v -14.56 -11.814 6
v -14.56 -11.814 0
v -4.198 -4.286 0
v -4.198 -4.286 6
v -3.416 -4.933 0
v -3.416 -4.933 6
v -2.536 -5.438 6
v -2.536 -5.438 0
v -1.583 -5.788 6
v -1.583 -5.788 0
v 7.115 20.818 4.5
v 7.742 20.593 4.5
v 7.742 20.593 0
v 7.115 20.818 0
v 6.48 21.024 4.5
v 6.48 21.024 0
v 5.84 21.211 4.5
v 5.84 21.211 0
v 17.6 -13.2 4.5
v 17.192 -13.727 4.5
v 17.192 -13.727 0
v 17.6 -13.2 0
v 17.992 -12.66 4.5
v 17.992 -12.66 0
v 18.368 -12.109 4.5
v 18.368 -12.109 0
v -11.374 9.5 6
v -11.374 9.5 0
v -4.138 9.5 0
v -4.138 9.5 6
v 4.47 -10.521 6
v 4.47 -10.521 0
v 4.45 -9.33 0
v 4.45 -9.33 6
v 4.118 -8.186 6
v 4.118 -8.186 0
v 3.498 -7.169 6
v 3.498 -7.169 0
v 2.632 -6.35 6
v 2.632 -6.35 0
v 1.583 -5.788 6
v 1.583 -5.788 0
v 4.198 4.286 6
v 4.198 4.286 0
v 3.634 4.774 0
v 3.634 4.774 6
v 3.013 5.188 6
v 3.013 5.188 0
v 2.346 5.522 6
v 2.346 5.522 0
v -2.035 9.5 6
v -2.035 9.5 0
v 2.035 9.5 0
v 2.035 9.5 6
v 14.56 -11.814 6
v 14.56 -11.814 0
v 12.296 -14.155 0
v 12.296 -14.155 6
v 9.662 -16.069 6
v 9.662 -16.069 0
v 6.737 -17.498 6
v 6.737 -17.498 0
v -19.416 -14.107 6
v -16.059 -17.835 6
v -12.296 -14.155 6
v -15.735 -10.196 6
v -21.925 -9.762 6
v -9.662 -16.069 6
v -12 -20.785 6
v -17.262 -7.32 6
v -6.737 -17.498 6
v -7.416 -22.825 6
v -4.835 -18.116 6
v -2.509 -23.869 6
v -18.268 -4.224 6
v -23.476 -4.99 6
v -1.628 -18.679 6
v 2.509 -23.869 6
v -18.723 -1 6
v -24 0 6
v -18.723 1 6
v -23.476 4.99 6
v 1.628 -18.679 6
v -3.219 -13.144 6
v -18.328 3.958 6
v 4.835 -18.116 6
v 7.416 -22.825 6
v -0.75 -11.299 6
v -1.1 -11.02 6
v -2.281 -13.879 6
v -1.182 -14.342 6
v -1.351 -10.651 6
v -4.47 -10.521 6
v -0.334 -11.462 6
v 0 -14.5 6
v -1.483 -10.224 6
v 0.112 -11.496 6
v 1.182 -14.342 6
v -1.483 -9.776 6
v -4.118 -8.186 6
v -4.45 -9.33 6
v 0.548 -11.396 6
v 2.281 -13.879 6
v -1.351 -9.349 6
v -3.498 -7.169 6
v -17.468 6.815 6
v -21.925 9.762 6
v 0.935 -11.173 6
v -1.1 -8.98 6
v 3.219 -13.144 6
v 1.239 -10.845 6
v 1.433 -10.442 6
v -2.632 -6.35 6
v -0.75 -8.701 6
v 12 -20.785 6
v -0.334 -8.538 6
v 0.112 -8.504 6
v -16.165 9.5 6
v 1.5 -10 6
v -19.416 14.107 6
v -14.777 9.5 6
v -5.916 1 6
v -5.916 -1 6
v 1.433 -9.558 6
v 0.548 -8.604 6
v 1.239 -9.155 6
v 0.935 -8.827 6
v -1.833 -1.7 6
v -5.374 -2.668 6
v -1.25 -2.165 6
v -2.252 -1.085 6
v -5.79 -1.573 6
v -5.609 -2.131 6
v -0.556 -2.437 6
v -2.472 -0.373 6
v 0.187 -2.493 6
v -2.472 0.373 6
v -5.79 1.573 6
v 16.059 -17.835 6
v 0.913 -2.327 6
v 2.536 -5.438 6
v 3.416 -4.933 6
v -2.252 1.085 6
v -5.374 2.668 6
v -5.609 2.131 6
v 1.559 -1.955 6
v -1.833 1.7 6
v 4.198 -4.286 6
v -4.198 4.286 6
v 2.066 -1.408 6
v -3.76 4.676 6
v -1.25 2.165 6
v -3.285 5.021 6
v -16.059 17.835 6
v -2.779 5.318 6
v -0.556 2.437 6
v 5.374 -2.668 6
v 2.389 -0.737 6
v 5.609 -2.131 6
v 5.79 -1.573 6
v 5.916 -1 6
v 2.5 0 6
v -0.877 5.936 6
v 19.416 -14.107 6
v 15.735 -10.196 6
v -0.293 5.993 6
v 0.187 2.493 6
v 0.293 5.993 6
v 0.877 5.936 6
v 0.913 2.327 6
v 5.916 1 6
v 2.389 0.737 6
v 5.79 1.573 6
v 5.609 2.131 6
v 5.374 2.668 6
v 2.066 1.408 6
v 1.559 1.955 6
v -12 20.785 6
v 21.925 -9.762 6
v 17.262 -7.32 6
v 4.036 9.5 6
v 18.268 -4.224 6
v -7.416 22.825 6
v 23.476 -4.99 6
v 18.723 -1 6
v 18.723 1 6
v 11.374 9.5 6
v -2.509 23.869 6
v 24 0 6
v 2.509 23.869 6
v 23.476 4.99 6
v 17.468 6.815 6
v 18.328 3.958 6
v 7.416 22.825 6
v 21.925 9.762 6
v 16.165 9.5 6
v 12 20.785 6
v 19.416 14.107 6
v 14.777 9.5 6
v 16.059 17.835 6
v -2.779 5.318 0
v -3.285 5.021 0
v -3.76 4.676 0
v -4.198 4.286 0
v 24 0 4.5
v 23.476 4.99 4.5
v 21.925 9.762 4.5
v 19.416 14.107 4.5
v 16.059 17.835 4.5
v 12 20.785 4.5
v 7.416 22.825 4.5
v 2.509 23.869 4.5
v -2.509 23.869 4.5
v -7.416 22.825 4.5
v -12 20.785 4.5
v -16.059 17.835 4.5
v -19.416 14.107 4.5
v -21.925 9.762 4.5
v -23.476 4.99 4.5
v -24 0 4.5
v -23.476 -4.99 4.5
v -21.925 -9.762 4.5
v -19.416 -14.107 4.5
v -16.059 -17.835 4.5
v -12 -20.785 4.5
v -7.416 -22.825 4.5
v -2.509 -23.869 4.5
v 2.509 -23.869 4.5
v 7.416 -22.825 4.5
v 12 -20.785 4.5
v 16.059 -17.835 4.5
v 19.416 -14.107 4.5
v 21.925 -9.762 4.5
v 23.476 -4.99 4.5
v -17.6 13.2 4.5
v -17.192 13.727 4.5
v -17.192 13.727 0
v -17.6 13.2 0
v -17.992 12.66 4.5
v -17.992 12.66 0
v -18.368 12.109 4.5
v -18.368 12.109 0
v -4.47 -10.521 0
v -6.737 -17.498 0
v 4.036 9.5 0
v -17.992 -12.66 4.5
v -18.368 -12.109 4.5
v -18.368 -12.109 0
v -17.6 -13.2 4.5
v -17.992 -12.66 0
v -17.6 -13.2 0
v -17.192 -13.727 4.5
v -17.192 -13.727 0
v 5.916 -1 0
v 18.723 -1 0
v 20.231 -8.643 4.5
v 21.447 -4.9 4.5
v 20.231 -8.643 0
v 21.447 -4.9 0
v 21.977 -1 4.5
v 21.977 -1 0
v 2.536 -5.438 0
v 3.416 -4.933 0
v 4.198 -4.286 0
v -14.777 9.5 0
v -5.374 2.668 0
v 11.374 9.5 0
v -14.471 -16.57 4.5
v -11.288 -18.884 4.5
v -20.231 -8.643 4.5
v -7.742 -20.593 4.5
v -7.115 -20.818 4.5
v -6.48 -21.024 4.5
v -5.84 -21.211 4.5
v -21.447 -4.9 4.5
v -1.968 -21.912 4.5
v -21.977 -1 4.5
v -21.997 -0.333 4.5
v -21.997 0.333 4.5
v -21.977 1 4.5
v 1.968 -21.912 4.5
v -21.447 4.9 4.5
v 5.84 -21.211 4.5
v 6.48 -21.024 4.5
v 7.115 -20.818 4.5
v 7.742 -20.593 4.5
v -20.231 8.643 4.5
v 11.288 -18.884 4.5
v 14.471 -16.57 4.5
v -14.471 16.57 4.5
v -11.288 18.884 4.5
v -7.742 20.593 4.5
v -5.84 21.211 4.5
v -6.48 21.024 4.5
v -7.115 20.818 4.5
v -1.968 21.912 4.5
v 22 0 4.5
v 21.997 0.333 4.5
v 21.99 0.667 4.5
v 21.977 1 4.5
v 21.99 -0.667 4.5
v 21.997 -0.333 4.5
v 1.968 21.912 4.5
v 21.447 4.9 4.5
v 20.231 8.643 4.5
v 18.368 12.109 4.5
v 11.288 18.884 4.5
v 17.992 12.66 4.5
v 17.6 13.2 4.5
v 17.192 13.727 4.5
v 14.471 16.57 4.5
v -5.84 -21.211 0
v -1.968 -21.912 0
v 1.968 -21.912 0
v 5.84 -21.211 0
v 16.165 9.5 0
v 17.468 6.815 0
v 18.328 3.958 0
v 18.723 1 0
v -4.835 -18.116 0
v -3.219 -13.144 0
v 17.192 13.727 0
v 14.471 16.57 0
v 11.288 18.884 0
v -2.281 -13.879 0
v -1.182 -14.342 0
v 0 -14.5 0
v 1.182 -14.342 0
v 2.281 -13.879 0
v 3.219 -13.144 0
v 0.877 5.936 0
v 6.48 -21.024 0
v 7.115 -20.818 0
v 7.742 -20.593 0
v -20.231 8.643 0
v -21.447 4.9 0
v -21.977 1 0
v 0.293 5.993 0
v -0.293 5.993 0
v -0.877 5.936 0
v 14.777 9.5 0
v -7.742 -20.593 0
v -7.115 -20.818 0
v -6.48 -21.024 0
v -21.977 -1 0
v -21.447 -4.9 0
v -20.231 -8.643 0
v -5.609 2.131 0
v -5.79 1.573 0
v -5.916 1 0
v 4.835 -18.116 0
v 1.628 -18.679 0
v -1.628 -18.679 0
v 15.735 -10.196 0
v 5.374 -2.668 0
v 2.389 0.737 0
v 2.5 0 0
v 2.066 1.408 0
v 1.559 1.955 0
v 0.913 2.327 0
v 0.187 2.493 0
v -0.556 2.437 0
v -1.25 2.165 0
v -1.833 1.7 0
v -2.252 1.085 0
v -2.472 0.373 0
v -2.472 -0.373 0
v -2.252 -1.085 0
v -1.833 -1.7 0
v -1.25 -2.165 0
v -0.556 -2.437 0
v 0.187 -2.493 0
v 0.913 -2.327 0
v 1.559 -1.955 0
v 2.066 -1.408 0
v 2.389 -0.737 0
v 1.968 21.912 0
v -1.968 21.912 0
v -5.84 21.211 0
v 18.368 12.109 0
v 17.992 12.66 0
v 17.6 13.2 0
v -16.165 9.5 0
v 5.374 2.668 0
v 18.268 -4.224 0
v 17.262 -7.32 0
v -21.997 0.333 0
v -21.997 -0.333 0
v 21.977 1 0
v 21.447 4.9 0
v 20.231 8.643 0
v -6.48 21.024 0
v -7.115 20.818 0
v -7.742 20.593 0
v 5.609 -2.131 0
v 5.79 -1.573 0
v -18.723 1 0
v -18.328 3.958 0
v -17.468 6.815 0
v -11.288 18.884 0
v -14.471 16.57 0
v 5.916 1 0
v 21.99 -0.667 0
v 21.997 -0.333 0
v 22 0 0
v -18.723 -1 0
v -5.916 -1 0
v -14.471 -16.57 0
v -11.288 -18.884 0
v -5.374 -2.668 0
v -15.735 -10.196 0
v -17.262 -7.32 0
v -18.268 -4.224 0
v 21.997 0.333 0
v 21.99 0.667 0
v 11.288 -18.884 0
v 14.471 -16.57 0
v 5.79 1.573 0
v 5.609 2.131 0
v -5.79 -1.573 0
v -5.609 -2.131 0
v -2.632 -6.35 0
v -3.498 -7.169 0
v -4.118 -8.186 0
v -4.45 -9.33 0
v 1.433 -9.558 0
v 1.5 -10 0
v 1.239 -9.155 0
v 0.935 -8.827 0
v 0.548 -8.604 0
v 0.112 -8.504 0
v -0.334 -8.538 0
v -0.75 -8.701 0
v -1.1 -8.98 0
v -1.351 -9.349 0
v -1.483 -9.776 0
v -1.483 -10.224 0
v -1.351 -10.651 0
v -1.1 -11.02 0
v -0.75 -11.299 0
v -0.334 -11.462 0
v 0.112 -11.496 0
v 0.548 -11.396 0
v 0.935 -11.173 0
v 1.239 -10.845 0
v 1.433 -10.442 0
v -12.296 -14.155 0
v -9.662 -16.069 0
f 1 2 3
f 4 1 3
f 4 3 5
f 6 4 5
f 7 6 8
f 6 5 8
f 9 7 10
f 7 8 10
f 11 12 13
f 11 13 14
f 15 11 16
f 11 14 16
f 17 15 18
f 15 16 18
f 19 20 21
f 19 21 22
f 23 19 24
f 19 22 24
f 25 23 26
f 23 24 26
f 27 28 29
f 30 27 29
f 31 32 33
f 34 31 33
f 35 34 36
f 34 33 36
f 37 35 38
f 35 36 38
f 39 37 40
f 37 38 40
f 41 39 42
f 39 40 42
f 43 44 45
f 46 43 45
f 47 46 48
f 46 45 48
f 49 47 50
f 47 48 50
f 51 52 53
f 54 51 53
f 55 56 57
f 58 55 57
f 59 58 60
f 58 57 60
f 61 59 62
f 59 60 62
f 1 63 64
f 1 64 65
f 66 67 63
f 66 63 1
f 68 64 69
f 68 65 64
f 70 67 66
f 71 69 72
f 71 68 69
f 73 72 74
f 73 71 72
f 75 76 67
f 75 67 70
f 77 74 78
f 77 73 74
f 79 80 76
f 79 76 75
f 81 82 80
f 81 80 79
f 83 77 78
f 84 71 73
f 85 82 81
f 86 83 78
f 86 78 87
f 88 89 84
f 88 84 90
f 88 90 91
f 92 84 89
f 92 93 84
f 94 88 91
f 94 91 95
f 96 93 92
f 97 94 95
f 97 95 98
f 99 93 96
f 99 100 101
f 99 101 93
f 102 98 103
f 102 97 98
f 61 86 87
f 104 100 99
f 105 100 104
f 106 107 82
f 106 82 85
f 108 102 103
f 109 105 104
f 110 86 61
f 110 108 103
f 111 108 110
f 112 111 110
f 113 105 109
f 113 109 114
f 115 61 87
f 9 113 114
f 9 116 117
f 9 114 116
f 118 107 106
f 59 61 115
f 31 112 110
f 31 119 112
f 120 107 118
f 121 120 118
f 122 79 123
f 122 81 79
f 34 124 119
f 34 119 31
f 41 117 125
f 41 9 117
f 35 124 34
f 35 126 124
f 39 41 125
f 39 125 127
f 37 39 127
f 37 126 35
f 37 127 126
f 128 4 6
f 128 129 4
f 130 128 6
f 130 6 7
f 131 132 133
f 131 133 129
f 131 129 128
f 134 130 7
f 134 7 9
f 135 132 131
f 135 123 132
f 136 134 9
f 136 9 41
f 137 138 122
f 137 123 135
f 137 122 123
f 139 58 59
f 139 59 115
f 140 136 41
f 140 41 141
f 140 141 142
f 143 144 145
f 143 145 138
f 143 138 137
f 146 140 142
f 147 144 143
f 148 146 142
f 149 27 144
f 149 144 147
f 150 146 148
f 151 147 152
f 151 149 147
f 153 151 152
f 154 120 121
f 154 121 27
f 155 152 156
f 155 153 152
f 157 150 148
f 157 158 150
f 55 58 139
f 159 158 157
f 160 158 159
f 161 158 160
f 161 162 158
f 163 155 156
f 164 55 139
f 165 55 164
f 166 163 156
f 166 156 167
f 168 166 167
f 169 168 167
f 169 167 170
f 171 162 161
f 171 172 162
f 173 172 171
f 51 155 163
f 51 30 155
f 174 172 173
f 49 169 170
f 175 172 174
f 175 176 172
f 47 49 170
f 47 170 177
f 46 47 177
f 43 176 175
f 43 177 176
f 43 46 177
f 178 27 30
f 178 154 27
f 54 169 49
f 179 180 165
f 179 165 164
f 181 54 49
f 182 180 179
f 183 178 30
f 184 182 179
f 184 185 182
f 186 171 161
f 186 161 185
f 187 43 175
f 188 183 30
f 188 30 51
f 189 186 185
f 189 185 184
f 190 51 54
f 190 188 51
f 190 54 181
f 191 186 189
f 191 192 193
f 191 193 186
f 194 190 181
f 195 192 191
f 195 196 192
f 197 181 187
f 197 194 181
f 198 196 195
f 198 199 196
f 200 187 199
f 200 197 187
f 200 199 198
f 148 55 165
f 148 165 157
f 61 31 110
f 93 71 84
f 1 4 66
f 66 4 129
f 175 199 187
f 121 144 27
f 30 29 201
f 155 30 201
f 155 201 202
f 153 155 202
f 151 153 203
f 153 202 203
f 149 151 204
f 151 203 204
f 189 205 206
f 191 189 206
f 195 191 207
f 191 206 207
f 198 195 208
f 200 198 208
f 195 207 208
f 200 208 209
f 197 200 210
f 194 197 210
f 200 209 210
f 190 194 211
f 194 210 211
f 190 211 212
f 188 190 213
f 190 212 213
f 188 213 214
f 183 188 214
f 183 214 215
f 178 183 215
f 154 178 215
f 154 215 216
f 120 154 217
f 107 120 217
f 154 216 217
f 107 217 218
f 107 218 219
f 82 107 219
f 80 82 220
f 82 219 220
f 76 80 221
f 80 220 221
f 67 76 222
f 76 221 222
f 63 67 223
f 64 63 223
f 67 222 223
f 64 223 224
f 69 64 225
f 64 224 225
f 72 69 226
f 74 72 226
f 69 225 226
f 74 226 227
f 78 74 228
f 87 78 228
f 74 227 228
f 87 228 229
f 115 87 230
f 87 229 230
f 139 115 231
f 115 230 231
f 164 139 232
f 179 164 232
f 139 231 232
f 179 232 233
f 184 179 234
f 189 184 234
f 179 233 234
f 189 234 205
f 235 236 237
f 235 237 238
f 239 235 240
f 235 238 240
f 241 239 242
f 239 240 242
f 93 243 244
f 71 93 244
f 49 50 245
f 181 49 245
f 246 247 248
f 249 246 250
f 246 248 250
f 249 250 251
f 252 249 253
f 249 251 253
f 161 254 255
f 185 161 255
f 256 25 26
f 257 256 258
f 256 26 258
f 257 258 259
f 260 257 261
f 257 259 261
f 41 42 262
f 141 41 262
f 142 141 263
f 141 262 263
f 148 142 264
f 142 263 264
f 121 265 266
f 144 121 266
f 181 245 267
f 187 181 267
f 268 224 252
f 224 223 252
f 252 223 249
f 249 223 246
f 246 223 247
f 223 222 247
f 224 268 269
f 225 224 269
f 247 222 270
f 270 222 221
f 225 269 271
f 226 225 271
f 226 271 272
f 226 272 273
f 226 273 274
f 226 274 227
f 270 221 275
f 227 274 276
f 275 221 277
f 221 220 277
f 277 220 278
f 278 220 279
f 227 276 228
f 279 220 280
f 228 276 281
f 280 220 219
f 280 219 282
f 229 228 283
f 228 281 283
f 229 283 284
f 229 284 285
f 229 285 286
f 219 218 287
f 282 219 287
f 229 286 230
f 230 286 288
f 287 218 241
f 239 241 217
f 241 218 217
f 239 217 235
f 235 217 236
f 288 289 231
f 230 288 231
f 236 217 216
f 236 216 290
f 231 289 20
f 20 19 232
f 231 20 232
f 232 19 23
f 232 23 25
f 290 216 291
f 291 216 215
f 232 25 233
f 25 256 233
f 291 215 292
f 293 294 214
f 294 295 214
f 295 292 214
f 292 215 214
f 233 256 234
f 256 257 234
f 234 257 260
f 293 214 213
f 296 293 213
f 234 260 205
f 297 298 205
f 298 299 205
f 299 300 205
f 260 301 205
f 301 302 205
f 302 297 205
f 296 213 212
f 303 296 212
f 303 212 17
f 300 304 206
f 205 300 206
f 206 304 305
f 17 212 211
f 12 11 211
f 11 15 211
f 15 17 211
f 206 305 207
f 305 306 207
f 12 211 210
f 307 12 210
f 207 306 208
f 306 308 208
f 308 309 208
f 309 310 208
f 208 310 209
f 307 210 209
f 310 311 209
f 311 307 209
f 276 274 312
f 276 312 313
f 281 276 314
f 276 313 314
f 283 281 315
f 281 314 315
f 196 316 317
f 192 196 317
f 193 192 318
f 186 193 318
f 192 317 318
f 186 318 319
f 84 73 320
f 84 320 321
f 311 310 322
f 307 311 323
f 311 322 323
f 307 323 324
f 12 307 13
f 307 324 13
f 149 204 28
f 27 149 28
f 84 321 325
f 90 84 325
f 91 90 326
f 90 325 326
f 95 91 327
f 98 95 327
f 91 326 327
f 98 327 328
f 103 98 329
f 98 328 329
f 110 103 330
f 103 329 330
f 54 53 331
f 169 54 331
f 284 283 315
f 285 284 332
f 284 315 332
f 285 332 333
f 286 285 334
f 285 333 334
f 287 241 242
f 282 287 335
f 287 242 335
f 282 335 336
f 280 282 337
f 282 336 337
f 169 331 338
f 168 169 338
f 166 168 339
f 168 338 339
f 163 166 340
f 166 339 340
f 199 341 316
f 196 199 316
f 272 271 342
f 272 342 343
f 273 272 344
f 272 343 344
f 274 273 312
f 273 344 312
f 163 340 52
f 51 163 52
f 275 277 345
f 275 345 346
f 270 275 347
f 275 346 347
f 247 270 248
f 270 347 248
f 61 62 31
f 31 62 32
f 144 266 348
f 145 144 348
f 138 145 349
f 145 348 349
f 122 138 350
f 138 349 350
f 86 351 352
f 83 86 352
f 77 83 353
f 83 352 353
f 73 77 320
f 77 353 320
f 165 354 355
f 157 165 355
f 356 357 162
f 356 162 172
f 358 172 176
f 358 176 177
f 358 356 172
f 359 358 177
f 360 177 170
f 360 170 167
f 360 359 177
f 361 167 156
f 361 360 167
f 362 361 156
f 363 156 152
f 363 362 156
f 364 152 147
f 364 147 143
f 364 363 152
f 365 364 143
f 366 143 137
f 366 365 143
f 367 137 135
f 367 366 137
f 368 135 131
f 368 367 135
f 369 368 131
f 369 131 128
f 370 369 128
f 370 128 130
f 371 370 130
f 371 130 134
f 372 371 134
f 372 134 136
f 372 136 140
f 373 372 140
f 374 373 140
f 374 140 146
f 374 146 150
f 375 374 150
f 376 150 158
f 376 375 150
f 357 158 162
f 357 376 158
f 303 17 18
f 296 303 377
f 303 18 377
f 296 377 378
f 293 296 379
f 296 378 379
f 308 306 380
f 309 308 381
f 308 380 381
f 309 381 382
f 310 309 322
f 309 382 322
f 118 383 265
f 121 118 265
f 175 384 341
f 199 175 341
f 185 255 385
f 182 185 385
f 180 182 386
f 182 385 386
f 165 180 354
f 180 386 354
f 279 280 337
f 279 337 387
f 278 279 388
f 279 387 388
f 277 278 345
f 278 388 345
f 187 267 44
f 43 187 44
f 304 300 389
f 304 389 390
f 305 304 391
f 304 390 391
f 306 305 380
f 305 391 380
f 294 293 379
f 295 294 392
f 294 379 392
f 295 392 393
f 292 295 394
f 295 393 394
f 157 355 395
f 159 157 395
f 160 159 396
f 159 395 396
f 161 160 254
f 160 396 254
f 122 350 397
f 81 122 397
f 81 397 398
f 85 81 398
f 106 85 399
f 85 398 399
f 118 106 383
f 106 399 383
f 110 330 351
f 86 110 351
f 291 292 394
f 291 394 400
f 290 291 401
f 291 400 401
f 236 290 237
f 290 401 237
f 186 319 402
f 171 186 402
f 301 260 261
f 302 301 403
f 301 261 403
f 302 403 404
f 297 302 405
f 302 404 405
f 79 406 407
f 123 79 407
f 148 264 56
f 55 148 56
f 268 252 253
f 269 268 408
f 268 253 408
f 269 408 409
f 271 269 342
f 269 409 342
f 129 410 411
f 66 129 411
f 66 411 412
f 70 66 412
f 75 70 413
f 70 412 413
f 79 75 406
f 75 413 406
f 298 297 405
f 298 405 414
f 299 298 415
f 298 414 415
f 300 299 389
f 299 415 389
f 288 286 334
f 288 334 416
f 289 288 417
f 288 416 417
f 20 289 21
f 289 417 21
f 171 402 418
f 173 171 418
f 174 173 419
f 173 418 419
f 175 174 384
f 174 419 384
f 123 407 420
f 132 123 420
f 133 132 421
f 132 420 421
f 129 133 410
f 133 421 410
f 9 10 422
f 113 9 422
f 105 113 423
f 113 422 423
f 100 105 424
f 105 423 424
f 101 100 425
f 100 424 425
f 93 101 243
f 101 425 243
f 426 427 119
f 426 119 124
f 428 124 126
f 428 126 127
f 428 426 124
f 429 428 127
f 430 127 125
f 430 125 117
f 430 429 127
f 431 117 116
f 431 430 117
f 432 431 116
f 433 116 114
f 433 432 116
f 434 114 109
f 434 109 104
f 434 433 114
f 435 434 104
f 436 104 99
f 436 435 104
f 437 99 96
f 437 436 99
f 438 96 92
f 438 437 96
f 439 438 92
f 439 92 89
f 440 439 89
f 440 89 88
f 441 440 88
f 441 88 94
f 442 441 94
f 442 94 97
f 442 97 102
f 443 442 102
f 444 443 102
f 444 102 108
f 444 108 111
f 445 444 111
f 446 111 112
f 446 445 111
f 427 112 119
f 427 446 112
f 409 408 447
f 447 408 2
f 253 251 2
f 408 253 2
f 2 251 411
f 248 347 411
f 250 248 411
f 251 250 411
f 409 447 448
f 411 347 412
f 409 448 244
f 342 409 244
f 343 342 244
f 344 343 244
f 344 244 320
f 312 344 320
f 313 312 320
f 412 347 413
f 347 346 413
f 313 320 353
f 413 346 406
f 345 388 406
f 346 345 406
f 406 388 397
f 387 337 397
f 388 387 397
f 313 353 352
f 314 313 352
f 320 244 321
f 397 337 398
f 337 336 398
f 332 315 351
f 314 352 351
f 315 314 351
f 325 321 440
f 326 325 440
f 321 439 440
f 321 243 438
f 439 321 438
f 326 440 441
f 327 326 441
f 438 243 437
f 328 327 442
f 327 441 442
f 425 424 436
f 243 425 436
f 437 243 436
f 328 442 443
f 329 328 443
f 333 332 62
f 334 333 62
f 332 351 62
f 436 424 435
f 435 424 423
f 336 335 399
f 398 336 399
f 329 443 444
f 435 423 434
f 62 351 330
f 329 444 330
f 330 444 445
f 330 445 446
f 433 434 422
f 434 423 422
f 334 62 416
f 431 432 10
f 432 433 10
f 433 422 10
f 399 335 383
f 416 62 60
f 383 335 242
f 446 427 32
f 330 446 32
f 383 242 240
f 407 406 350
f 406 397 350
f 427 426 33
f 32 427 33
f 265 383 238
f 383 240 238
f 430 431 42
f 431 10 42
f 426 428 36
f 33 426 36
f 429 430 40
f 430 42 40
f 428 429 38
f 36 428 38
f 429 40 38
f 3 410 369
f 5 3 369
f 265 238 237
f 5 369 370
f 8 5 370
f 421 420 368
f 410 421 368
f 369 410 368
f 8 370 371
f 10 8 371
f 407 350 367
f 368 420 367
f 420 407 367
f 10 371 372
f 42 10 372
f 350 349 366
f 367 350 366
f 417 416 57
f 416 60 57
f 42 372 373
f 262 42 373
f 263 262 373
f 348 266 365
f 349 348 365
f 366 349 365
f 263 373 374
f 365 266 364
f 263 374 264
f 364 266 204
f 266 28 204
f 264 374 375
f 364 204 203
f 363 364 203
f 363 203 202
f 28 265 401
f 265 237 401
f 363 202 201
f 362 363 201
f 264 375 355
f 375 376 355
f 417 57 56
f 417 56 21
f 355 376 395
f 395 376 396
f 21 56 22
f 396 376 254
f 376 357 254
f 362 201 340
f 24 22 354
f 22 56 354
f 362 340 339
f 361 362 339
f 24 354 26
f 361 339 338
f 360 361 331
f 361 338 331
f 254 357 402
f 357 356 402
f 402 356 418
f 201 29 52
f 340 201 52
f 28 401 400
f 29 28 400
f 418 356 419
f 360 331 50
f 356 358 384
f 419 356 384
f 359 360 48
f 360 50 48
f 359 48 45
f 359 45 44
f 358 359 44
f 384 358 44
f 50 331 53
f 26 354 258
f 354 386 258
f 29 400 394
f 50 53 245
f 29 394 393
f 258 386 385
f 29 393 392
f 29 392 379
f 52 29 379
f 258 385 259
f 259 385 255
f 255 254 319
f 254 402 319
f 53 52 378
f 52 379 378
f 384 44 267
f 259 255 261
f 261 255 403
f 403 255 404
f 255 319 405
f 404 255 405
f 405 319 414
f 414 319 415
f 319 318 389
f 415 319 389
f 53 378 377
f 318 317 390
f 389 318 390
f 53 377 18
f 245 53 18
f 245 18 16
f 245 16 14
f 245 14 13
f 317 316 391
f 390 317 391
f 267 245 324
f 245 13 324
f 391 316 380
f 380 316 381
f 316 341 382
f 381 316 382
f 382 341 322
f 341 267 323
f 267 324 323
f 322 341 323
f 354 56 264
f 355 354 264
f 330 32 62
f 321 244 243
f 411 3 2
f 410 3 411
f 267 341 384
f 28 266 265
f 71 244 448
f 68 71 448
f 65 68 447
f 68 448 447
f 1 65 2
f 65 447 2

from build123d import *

# Parameters (mm, degrees)
ESQUISSE1_R        = 6
ESQUISSE1_R_2      = 2.5
ESQUISSE1_R_3      = 1.5
BOSS_EXTRU_1_DEPTH = 6
BOSS_EXTRU_2_START = -1.5
ESQUISSE3_R        = 24
ESQUISSE3_R_2      = 22
BOSS_EXTRU_2_DEPTH = 1.5


with BuildPart() as part:
    # Esquisse1 → Boss.-Extru.1 (new body)
    # profile 1 of 61: a face of its own
    with BuildSketch(Plane.XY):
        Circle(ESQUISSE1_R)
        Circle(ESQUISSE1_R_2, mode=Mode.SUBTRACT)
    # profile 2 of 61: a face of its own
    with BuildSketch(Plane.XY):
        with BuildLine():
            Line((-14.776929861, 9.5), (-5.373994337, 2.668367454))
            ThreePointArc((-5.373994337, 2.668367454), (-4.854101966, 3.526711514), (-4.198423832, 4.286401442))
            Line((-4.198423832, 4.286401442), (-11.374326628, 9.5))
            Line((-11.374326628, 9.5), (-14.776929861, 9.5))
        make_face()
    # profile 3 of 61: a face of its own
    with BuildSketch(Plane.XY):
        with BuildLine():
            Line((-14.559694243, 11.814305039), (-11.374326628, 9.5))
            Line((-11.374326628, 9.5), (-4.138199338, 9.5))
            Line((-4.138199338, 9.5), (-4.469792035, 10.520537382))
            Line((-4.469792035, 10.520537382), (-6.736878839, 17.497913119))
            ThreePointArc((-6.736878839, 17.497913119), (-11.02097348, 15.169068645), (-14.559694243, 11.814305039))
        make_face()
    # profile 4 of 61: a face of its own
    with BuildSketch(Plane.XY):
        with BuildLine():
            Line((-4.138199338, 9.5), (-2.03527489, 9.5))
            Line((-2.03527489, 9.5), (-3.219339867, 13.144177288))
            Line((-3.219339867, 13.144177288), (-4.834765807, 18.115947107))
            ThreePointArc((-4.834765807, 18.115947107), (-5.794068645, 17.832309681), (-6.736878839, 17.497913119))
            Line((-6.736878839, 17.497913119), (-4.469792035, 10.520537382))
            Line((-4.469792035, 10.520537382), (-4.138199338, 9.5))
        make_face()
    # profile 5 of 61: a face of its own
    with BuildSketch(Plane.XY):
        with BuildLine():
            Line((-2.03527489, 9.5), (2.03527489, 9.5))
            Line((2.03527489, 9.5), (3.219339867, 13.144177288))
            Line((3.219339867, 13.144177288), (4.834765807, 18.115947107))
            ThreePointArc((4.834765807, 18.115947107), (0, 18.75), (-4.834765807, 18.115947107))
            Line((-4.834765807, 18.115947107), (-3.219339867, 13.144177288))
            Line((-3.219339867, 13.144177288), (-2.03527489, 9.5))
        make_face()
    # profile 6 of 61: a face of its own
    with BuildSketch(Plane.XY):
        with BuildLine():
            Line((2.03527489, 9.5), (4.03620298, 9.5))
            Line((4.03620298, 9.5), (4.469792035, 10.520537382))
            Line((4.469792035, 10.520537382), (6.736878839, 17.497913119))
            ThreePointArc((6.736878839, 17.497913119), (5.794068645, 17.832309681), (4.834765807, 18.115947107))
            Line((4.834765807, 18.115947107), (3.219339867, 13.144177288))
            Line((3.219339867, 13.144177288), (2.03527489, 9.5))
        make_face()
    # profile 7 of 61: a face of its own
    with BuildSketch(Plane.XY):
        with BuildLine():
            Line((4.03620298, 9.5), (11.374326628, 9.5))
            Line((11.374326628, 9.5), (14.559694243, 11.814305039))
            ThreePointArc((14.559694243, 11.814305039), (11.02097348, 15.169068645), (6.736878839, 17.497913119))
            Line((6.736878839, 17.497913119), (4.469792035, 10.520537382))
            Line((4.469792035, 10.520537382), (4.03620298, 9.5))
        make_face()
    # profile 8 of 61: a face of its own
    with BuildSketch(Plane.XY):
        with BuildLine():
            Line((11.374326628, 9.5), (14.776929861, 9.5))
            Line((14.776929861, 9.5), (15.735264747, 10.196271051))
            ThreePointArc((15.735264747, 10.196271051), (15.169068645, 11.02097348), (14.559694243, 11.814305039))
            Line((14.559694243, 11.814305039), (11.374326628, 9.5))
        make_face()
    # profile 9 of 61: a face of its own
    with BuildSketch(Plane.XY):
        with BuildLine():
            ThreePointArc((4.198423832, 4.286401442), (4.854101966, 3.526711514), (5.373994337, 2.668367454))
            Line((5.373994337, 2.668367454), (14.776929861, 9.5))
            Line((14.776929861, 9.5), (11.374326628, 9.5))
            Line((11.374326628, 9.5), (4.198423832, 4.286401442))
        make_face()
    # profile 10 of 61: a face of its own
    with BuildSketch(Plane.XY):
        with BuildLine():
            ThreePointArc((0.877112677, 5.935543223), (1.624852602, 5.775798994), (2.346205228, 5.522256878))
            Line((2.346205228, 5.522256878), (4.03620298, 9.5))
            Line((4.03620298, 9.5), (2.03527489, 9.5))
            Line((2.03527489, 9.5), (0.877112677, 5.935543223))
        make_face()
    # profile 11 of 61: a face of its own
    with BuildSketch(Plane.XY):
        with BuildLine():
            ThreePointArc((-2.779225709, 5.317509234), (-1.854101966, 5.706339098), (-0.877112677, 5.935543223))
            Line((-0.877112677, 5.935543223), (-2.03527489, 9.5))
            Line((-2.03527489, 9.5), (-4.138199338, 9.5))
            Line((-4.138199338, 9.5), (-2.779225709, 5.317509234))
        make_face()
    # profile 12 of 61: a face of its own
    with BuildSketch(Plane.XY):
        with BuildLine():
            Line((-14.559694243, -11.814305039), (-4.198423832, -4.286401442))
            ThreePointArc((-4.198423832, -4.286401442), (-4.854101966, -3.526711514), (-5.373994337, -2.668367454))
            Line((-5.373994337, -2.668367454), (-15.735264747, -10.196271051))
            ThreePointArc((-15.735264747, -10.196271051), (-15.169068645, -11.02097348), (-14.559694243, -11.814305039))
        make_face()
    # profile 13 of 61: a face of its own
    with BuildSketch(Plane.XY):
        with BuildLine():
            Line((-18.723314343, -1), (-5.916079783, -1))
            ThreePointArc((-5.916079783, -1), (-6, 0), (-5.916079783, 1))
            Line((-5.916079783, 1), (-18.723314343, 1))
            ThreePointArc((-18.723314343, 1), (-18.75, 0), (-18.723314343, -1))
        make_face()
    # profile 14 of 61: a face of its own
    with BuildSketch(Plane.XY):
        with BuildLine():
            ThreePointArc((6, 0), (5.978983137, -0.501757562), (5.916079783, -1))
            Line((5.916079783, -1), (18.723314343, -1))
            ThreePointArc((18.723314343, -1), (18.743327399, -0.500177999), (18.75, 0))
            ThreePointArc((18.75, 0), (18.743327399, 0.500177999), (18.723314343, 1))
            Line((18.723314343, 1), (5.916079783, 1))
            ThreePointArc((5.916079783, 1), (5.978983137, 0.501757562), (6, 0))
        make_face()
    # profile 15 of 61: a face of its own
    with BuildSketch(Plane.XY):
        with BuildLine():
            ThreePointArc((18.723314343, -1), (17.832309681, -5.794068645), (15.735264747, -10.196271051))
            Line((15.735264747, -10.196271051), (16.342858961, -10.637714087))
            ThreePointArc((16.342858961, -10.637714087), (18.545602068, -6.02583139), (19.474342094, -1))
            Line((19.474342094, -1), (18.723314343, -1))
        make_face()
    # profile 16 of 61: a face of its own
    with BuildSketch(Plane.XY):
        with BuildLine():
            ThreePointArc((18.75, 0), (18.743327399, -0.500177999), (18.723314343, -1))
            Line((18.723314343, -1), (19.474342094, -1))
            ThreePointArc((19.474342094, -1), (19.493584468, -0.500164555), (19.5, 0))
            ThreePointArc((19.5, 0), (19.493584468, 0.500164555), (19.474342094, 1))
            Line((19.474342094, 1), (18.723314343, 1))
            ThreePointArc((18.723314343, 1), (18.743327399, 0.500177999), (18.75, 0))
        make_face()
    # profile 17 of 61: a face of its own
    with BuildSketch(Plane.XY):
        with BuildLine():
            ThreePointArc((16.16516316, 9.5), (17.954497087, 5.403566819), (18.723314343, 1))
            Line((18.723314343, 1), (19.474342094, 1))
            ThreePointArc((19.474342094, 1), (18.545602068, 6.02583139), (16.342858961, 10.637714087))
            Line((16.342858961, 10.637714087), (15.735264747, 10.196271051))
            ThreePointArc((15.735264747, 10.196271051), (15.954012771, 9.850481028), (16.16516316, 9.5))
        make_face()
    # profile 18 of 61: a face of its own
    with BuildSketch(Plane.XY):
        with BuildLine():
            Line((15.735264747, 10.196271051), (16.342858961, 10.637714087))
            ThreePointArc((16.342858961, 10.637714087), (15.77583139, 11.46181242), (15.167288456, 12.255748075))
            Line((15.167288456, 12.255748075), (14.559694243, 11.814305039))
            ThreePointArc((14.559694243, 11.814305039), (15.169068645, 11.02097348), (15.735264747, 10.196271051))
        make_face()
    # profile 19 of 61: a face of its own
    with BuildSketch(Plane.XY):
        with BuildLine():
            Line((14.559694243, 11.814305039), (15.167288456, 12.255748075))
            ThreePointArc((15.167288456, 12.255748075), (11.46181242, 15.77583139), (6.968959178, 18.212182955))
            Line((6.968959178, 18.212182955), (6.736878839, 17.497913119))
            ThreePointArc((6.736878839, 17.497913119), (11.02097348, 15.169068645), (14.559694243, 11.814305039))
        make_face()
    # profile 20 of 61: a face of its own
    with BuildSketch(Plane.XY):
        with BuildLine():
            Line((6.736878839, 17.497913119), (6.968959178, 18.212182955))
            ThreePointArc((6.968959178, 18.212182955), (6.02583139, 18.545602068), (5.066846145, 18.830216944))
            Line((5.066846145, 18.830216944), (4.834765807, 18.115947107))
            ThreePointArc((4.834765807, 18.115947107), (5.794068645, 17.832309681), (6.736878839, 17.497913119))
        make_face()
    # profile 21 of 61: a face of its own
    with BuildSketch(Plane.XY):
        with BuildLine():
            Line((4.834765807, 18.115947107), (5.066846145, 18.830216944))
            ThreePointArc((5.066846145, 18.830216944), (0, 19.5), (-5.066846145, 18.830216944))
            Line((-5.066846145, 18.830216944), (-4.834765807, 18.115947107))
            ThreePointArc((-4.834765807, 18.115947107), (0, 18.75), (4.834765807, 18.115947107))
        make_face()
    # profile 22 of 61: a face of its own
    with BuildSketch(Plane.XY):
        with BuildLine():
            Line((-4.834765807, 18.115947107), (-5.066846145, 18.830216944))
            ThreePointArc((-5.066846145, 18.830216944), (-6.02583139, 18.545602068), (-6.968959178, 18.212182955))
            Line((-6.968959178, 18.212182955), (-6.736878839, 17.497913119))
            ThreePointArc((-6.736878839, 17.497913119), (-5.794068645, 17.832309681), (-4.834765807, 18.115947107))
        make_face()
    # profile 23 of 61: a face of its own
    with BuildSketch(Plane.XY):
        with BuildLine():
            Line((-6.736878839, 17.497913119), (-6.968959178, 18.212182955))
            ThreePointArc((-6.968959178, 18.212182955), (-11.46181242, 15.77583139), (-15.167288456, 12.255748075))
            Line((-15.167288456, 12.255748075), (-14.559694243, 11.814305039))
            ThreePointArc((-14.559694243, 11.814305039), (-11.02097348, 15.169068645), (-6.736878839, 17.497913119))
        make_face()
    # profile 24 of 61: a face of its own
    with BuildSketch(Plane.XY):
        with BuildLine():
            ThreePointArc((-15.167288456, 12.255748075), (-15.77583139, 11.46181242), (-16.342858961, 10.637714087))
            Line((-16.342858961, 10.637714087), (-15.735264747, 10.196271051))
            ThreePointArc((-15.735264747, 10.196271051), (-15.169068645, 11.02097348), (-14.559694243, 11.814305039))
            Line((-14.559694243, 11.814305039), (-15.167288456, 12.255748075))
        make_face()
    # profile 25 of 61: a face of its own
    with BuildSketch(Plane.XY):
        with BuildLine():
            Line((-19.474342094, 1), (-18.723314343, 1))
            ThreePointArc((-18.723314343, 1), (-17.954497087, 5.403566819), (-16.16516316, 9.5))
            ThreePointArc((-16.16516316, 9.5), (-15.954012771, 9.850481028), (-15.735264747, 10.196271051))
            Line((-15.735264747, 10.196271051), (-16.342858961, 10.637714087))
            ThreePointArc((-16.342858961, 10.637714087), (-18.545602068, 6.02583139), (-19.474342094, 1))
        make_face()
    # profile 26 of 61: a face of its own
    with BuildSketch(Plane.XY):
        with BuildLine():
            Line((-19.474342094, -1), (-18.723314343, -1))
            ThreePointArc((-18.723314343, -1), (-18.75, 0), (-18.723314343, 1))
            Line((-18.723314343, 1), (-19.474342094, 1))
            ThreePointArc((-19.474342094, 1), (-19.5, 0), (-19.474342094, -1))
        make_face()
    # profile 27 of 61: a face of its own
    with BuildSketch(Plane.XY):
        with BuildLine():
            Line((-16.342858961, -10.637714087), (-15.735264747, -10.196271051))
            ThreePointArc((-15.735264747, -10.196271051), (-17.832309681, -5.794068645), (-18.723314343, -1))
            Line((-18.723314343, -1), (-19.474342094, -1))
            ThreePointArc((-19.474342094, -1), (-18.545602068, -6.02583139), (-16.342858961, -10.637714087))
        make_face()
    # profile 28 of 61: a face of its own
    with BuildSketch(Plane.XY):
        with BuildLine():
            Line((-15.167288456, -12.255748075), (-14.559694243, -11.814305039))
            ThreePointArc((-14.559694243, -11.814305039), (-15.169068645, -11.02097348), (-15.735264747, -10.196271051))
            Line((-15.735264747, -10.196271051), (-16.342858961, -10.637714087))
            ThreePointArc((-16.342858961, -10.637714087), (-15.77583139, -11.46181242), (-15.167288456, -12.255748075))
        make_face()
    # profile 29 of 61: a face of its own
    with BuildSketch(Plane.XY):
        with BuildLine():
            Line((5.840290615, -21.210634256), (5.066846145, -18.830216944))
            ThreePointArc((5.066846145, -18.830216944), (0, -19.5), (-5.066846145, -18.830216944))
            Line((-5.066846145, -18.830216944), (-5.840290615, -21.210634256))
            ThreePointArc((-5.840290615, -21.210634256), (0, -22), (5.840290615, -21.210634256))
        make_face()
    # profile 30 of 61: a face of its own
    with BuildSketch(Plane.XY):
        with BuildLine():
            Line((-17.192192367, -13.726926882), (-15.167288456, -12.255748075))
            ThreePointArc((-15.167288456, -12.255748075), (-15.77583139, -11.46181242), (-16.342858961, -10.637714087))
            Line((-16.342858961, -10.637714087), (-18.367762872, -12.108892893))
            ThreePointArc((-18.367762872, -12.108892893), (-17.798373876, -12.93127555), (-17.192192367, -13.726926882))
        make_face()
    # profile 31 of 61: a face of its own
    with BuildSketch(Plane.XY):
        with BuildLine():
            Line((-5.840290615, -21.210634256), (-5.066846145, -18.830216944))
            ThreePointArc((-5.066846145, -18.830216944), (-6.02583139, -18.545602068), (-6.968959178, -18.212182955))
            Line((-6.968959178, -18.212182955), (-7.742403648, -20.592600267))
            ThreePointArc((-7.742403648, -20.592600267), (-6.798373876, -20.923243358), (-5.840290615, -21.210634256))
        make_face()
    # profile 32 of 61: a face of its own
    with BuildSketch(Plane.XY):
        with BuildLine():
            ThreePointArc((-3.219339867, -13.144177288), (-4.06221109, -11.936089115), (-4.469792035, -10.520537382))
            Line((-4.469792035, -10.520537382), (-6.736878839, -17.497913119))
            ThreePointArc((-6.736878839, -17.497913119), (-5.794068645, -17.832309681), (-4.834765807, -18.115947107))
            Line((-4.834765807, -18.115947107), (-3.219339867, -13.144177288))
        make_face()
    # profile 33 of 61: a face of its own
    with BuildSketch(Plane.XY):
        with BuildLine():
            ThreePointArc((4.834765807, -18.115947107), (5.794068645, -17.832309681), (6.736878839, -17.497913119))
            Line((6.736878839, -17.497913119), (4.469792035, -10.520537382))
            ThreePointArc((4.469792035, -10.520537382), (4.06221109, -11.936089115), (3.219339867, -13.144177288))
            Line((3.219339867, -13.144177288), (4.834765807, -18.115947107))
        make_face()
    # profile 34 of 61: a face of its own
    with BuildSketch(Plane.XY):
        with BuildLine():
            Line((7.742403648, -20.592600267), (6.968959178, -18.212182955))
            ThreePointArc((6.968959178, -18.212182955), (6.02583139, -18.545602068), (5.066846145, -18.830216944))
            Line((5.066846145, -18.830216944), (5.840290615, -21.210634256))
            ThreePointArc((5.840290615, -21.210634256), (6.798373876, -20.923243358), (7.742403648, -20.592600267))
        make_face()
    # profile 35 of 61: a face of its own
    with BuildSketch(Plane.XY):
        with BuildLine():
            Line((17.192192367, -13.726926882), (15.167288456, -12.255748075))
            ThreePointArc((15.167288456, -12.255748075), (11.46181242, -15.77583139), (6.968959178, -18.212182955))
            Line((6.968959178, -18.212182955), (7.742403648, -20.592600267))
            ThreePointArc((7.742403648, -20.592600267), (12.93127555, -17.798373876), (17.192192367, -13.726926882))
        make_face()
    # profile 36 of 61: a face of its own
    with BuildSketch(Plane.XY):
        with BuildLine():
            Line((16.342858961, -10.637714087), (15.735264747, -10.196271051))
            ThreePointArc((15.735264747, -10.196271051), (15.169068645, -11.02097348), (14.559694243, -11.814305039))
            Line((14.559694243, -11.814305039), (15.167288456, -12.255748075))
            ThreePointArc((15.167288456, -12.255748075), (15.77583139, -11.46181242), (16.342858961, -10.637714087))
        make_face()
    # profile 37 of 61: a face of its own
    with BuildSketch(Plane.XY):
        with BuildLine():
            Line((15.167288456, -12.255748075), (14.559694243, -11.814305039))
            ThreePointArc((14.559694243, -11.814305039), (11.02097348, -15.169068645), (6.736878839, -17.497913119))
            Line((6.736878839, -17.497913119), (6.968959178, -18.212182955))
            ThreePointArc((6.968959178, -18.212182955), (11.46181242, -15.77583139), (15.167288456, -12.255748075))
        make_face()
    # profile 38 of 61: a face of its own
    with BuildSketch(Plane.XY):
        with BuildLine():
            Line((15.735264747, -10.196271051), (5.373994337, -2.668367454))
            ThreePointArc((5.373994337, -2.668367454), (4.854101966, -3.526711514), (4.198423832, -4.286401442))
            Line((4.198423832, -4.286401442), (14.559694243, -11.814305039))
            ThreePointArc((14.559694243, -11.814305039), (15.169068645, -11.02097348), (15.735264747, -10.196271051))
        make_face()
    # profile 39 of 61: a face of its own
    with BuildSketch(Plane.XY):
        with BuildLine():
            Line((-15.735264747, 10.196271051), (-14.776929861, 9.5))
            Line((-14.776929861, 9.5), (-11.374326628, 9.5))
            Line((-11.374326628, 9.5), (-14.559694243, 11.814305039))
            ThreePointArc((-14.559694243, 11.814305039), (-15.169068645, 11.02097348), (-15.735264747, 10.196271051))
        make_face()
    # profile 40 of 61: a face of its own
    with BuildSketch(Plane.XY):
        with BuildLine():
            ThreePointArc((-15.735264747, 10.196271051), (-15.954012771, 9.850481028), (-16.16516316, 9.5))
            Line((-16.16516316, 9.5), (-14.776929861, 9.5))
            Line((-14.776929861, 9.5), (-15.735264747, 10.196271051))
        make_face()
    # profile 41 of 61: a face of its own
    with BuildSketch(Plane.XY):
        with BuildLine():
            Line((14.776929861, 9.5), (16.16516316, 9.5))
            ThreePointArc((16.16516316, 9.5), (15.954012771, 9.850481028), (15.735264747, 10.196271051))
            Line((15.735264747, 10.196271051), (14.776929861, 9.5))
        make_face()
    # profile 42 of 61: a face of its own
    with BuildSketch(Plane.XY):
        with BuildLine():
            ThreePointArc((15.167288456, 12.255748075), (15.77583139, 11.46181242), (16.342858961, 10.637714087))
            Line((16.342858961, 10.637714087), (18.367762872, 12.108892893))
            ThreePointArc((18.367762872, 12.108892893), (17.798373876, 12.93127555), (17.192192367, 13.726926882))
            Line((17.192192367, 13.726926882), (15.167288456, 12.255748075))
        make_face()
    # profile 43 of 61: a face of its own
    with BuildSketch(Plane.XY):
        with BuildLine():
            ThreePointArc((16.342858961, 10.637714087), (18.545602068, 6.02583139), (19.474342094, 1))
            Line((19.474342094, 1), (21.977260976, 1))
            ThreePointArc((21.977260976, 1), (20.923243358, 6.798373876), (18.367762872, 12.108892893))
            Line((18.367762872, 12.108892893), (16.342858961, 10.637714087))
        make_face()
    # profile 44 of 61: a face of its own
    with BuildSketch(Plane.XY):
        with BuildLine():
            ThreePointArc((19.5, 0), (19.493584468, -0.500164555), (19.474342094, -1))
            Line((19.474342094, -1), (21.977260976, -1))
            ThreePointArc((21.977260976, -1), (21.994314509, -0.500129249), (22, 0))
            ThreePointArc((22, 0), (21.994314509, 0.500129249), (21.977260976, 1))
            Line((21.977260976, 1), (19.474342094, 1))
            ThreePointArc((19.474342094, 1), (19.493584468, 0.500164555), (19.5, 0))
        make_face()
    # profile 45 of 61: a face of its own
    with BuildSketch(Plane.XY):
        with BuildLine():
            ThreePointArc((19.474342094, -1), (18.545602068, -6.02583139), (16.342858961, -10.637714087))
            Line((16.342858961, -10.637714087), (18.367762872, -12.108892893))
            ThreePointArc((18.367762872, -12.108892893), (20.923243358, -6.798373876), (21.977260976, -1))
            Line((21.977260976, -1), (19.474342094, -1))
        make_face()
    # profile 46 of 61: a face of its own
    with BuildSketch(Plane.XY):
        with BuildLine():
            Line((18.367762872, -12.108892893), (16.342858961, -10.637714087))
            ThreePointArc((16.342858961, -10.637714087), (15.77583139, -11.46181242), (15.167288456, -12.255748075))
            Line((15.167288456, -12.255748075), (17.192192367, -13.726926882))
            ThreePointArc((17.192192367, -13.726926882), (17.798373876, -12.93127555), (18.367762872, -12.108892893))
        make_face()
    # profile 47 of 61: a face of its own
    with BuildSketch(Plane.XY):
        with BuildLine():
            ThreePointArc((6.968959178, 18.212182955), (11.46181242, 15.77583139), (15.167288456, 12.255748075))
            Line((15.167288456, 12.255748075), (17.192192367, 13.726926882))
            ThreePointArc((17.192192367, 13.726926882), (12.93127555, 17.798373876), (7.742403648, 20.592600267))
            Line((7.742403648, 20.592600267), (6.968959178, 18.212182955))
        make_face()
    # profile 48 of 61: a face of its own
    with BuildSketch(Plane.XY):
        with BuildLine():
            ThreePointArc((5.066846145, 18.830216944), (6.02583139, 18.545602068), (6.968959178, 18.212182955))
            Line((6.968959178, 18.212182955), (7.742403648, 20.592600267))
            ThreePointArc((7.742403648, 20.592600267), (6.798373876, 20.923243358), (5.840290615, 21.210634256))
            Line((5.840290615, 21.210634256), (5.066846145, 18.830216944))
        make_face()
    # profile 49 of 61: a face of its own
    with BuildSketch(Plane.XY):
        with BuildLine():
            ThreePointArc((-6.968959178, 18.212182955), (-6.02583139, 18.545602068), (-5.066846145, 18.830216944))
            Line((-5.066846145, 18.830216944), (-5.840290615, 21.210634256))
            ThreePointArc((-5.840290615, 21.210634256), (-6.798373876, 20.923243358), (-7.742403648, 20.592600267))
            Line((-7.742403648, 20.592600267), (-6.968959178, 18.212182955))
        make_face()
    # profile 50 of 61: a face of its own
    with BuildSketch(Plane.XY):
        with BuildLine():
            ThreePointArc((-15.167288456, 12.255748075), (-11.46181242, 15.77583139), (-6.968959178, 18.212182955))
            Line((-6.968959178, 18.212182955), (-7.742403648, 20.592600267))
            ThreePointArc((-7.742403648, 20.592600267), (-12.93127555, 17.798373876), (-17.192192367, 13.726926882))
            Line((-17.192192367, 13.726926882), (-15.167288456, 12.255748075))
        make_face()
    # profile 51 of 61: a face of its own
    with BuildSketch(Plane.XY):
        with BuildLine():
            ThreePointArc((-5.066846145, 18.830216944), (0, 19.5), (5.066846145, 18.830216944))
            Line((5.066846145, 18.830216944), (5.840290615, 21.210634256))
            ThreePointArc((5.840290615, 21.210634256), (0, 22), (-5.840290615, 21.210634256))
            Line((-5.840290615, 21.210634256), (-5.066846145, 18.830216944))
        make_face()
    # profile 52 of 61: a face of its own
    with BuildSketch(Plane.XY):
        with BuildLine():
            Line((-18.367762872, 12.108892893), (-16.342858961, 10.637714087))
            ThreePointArc((-16.342858961, 10.637714087), (-15.77583139, 11.46181242), (-15.167288456, 12.255748075))
            Line((-15.167288456, 12.255748075), (-17.192192367, 13.726926882))
            ThreePointArc((-17.192192367, 13.726926882), (-17.798373876, 12.93127555), (-18.367762872, 12.108892893))
        make_face()
    # profile 53 of 61: a face of its own
    with BuildSketch(Plane.XY):
        with BuildLine():
            Line((-21.977260976, 1), (-19.474342094, 1))
            ThreePointArc((-19.474342094, 1), (-18.545602068, 6.02583139), (-16.342858961, 10.637714087))
            Line((-16.342858961, 10.637714087), (-18.367762872, 12.108892893))
            ThreePointArc((-18.367762872, 12.108892893), (-20.923243358, 6.798373876), (-21.977260976, 1))
        make_face()
    # profile 54 of 61: a face of its own
    with BuildSketch(Plane.XY):
        with BuildLine():
            Line((-18.367762872, -12.108892893), (-16.342858961, -10.637714087))
            ThreePointArc((-16.342858961, -10.637714087), (-18.545602068, -6.02583139), (-19.474342094, -1))
            Line((-19.474342094, -1), (-21.977260976, -1))
            ThreePointArc((-21.977260976, -1), (-20.923243358, -6.798373876), (-18.367762872, -12.108892893))
        make_face()
    # profile 55 of 61: a face of its own
    with BuildSketch(Plane.XY):
        with BuildLine():
            Line((-21.977260976, -1), (-19.474342094, -1))
            ThreePointArc((-19.474342094, -1), (-19.5, 0), (-19.474342094, 1))
            Line((-19.474342094, 1), (-21.977260976, 1))
            ThreePointArc((-21.977260976, 1), (-22, 0), (-21.977260976, -1))
        make_face()
    # profile 56 of 61: a face of its own
    with BuildSketch(Plane.XY):
        with BuildLine():
            ThreePointArc((-6.968959178, -18.212182955), (-11.46181242, -15.77583139), (-15.167288456, -12.255748075))
            Line((-15.167288456, -12.255748075), (-17.192192367, -13.726926882))
            ThreePointArc((-17.192192367, -13.726926882), (-12.93127555, -17.798373876), (-7.742403648, -20.592600267))
            Line((-7.742403648, -20.592600267), (-6.968959178, -18.212182955))
        make_face()
    # profile 57 of 61: a face of its own
    with BuildSketch(Plane.XY):
        with BuildLine():
            ThreePointArc((-6.736878839, -17.497913119), (-11.02097348, -15.169068645), (-14.559694243, -11.814305039))
            Line((-14.559694243, -11.814305039), (-15.167288456, -12.255748075))
            ThreePointArc((-15.167288456, -12.255748075), (-11.46181242, -15.77583139), (-6.968959178, -18.212182955))
            Line((-6.968959178, -18.212182955), (-6.736878839, -17.497913119))
        make_face()
    # profile 58 of 61: a face of its own
    with BuildSketch(Plane.XY):
        with BuildLine():
            Line((-5.066846145, -18.830216944), (-4.834765807, -18.115947107))
            ThreePointArc((-4.834765807, -18.115947107), (-5.794068645, -17.832309681), (-6.736878839, -17.497913119))
            Line((-6.736878839, -17.497913119), (-6.968959178, -18.212182955))
            ThreePointArc((-6.968959178, -18.212182955), (-6.02583139, -18.545602068), (-5.066846145, -18.830216944))
        make_face()
    # profile 59 of 61: a face of its own
    with BuildSketch(Plane.XY):
        with BuildLine():
            Line((5.066846145, -18.830216944), (4.834765807, -18.115947107))
            ThreePointArc((4.834765807, -18.115947107), (0, -18.75), (-4.834765807, -18.115947107))
            Line((-4.834765807, -18.115947107), (-5.066846145, -18.830216944))
            ThreePointArc((-5.066846145, -18.830216944), (0, -19.5), (5.066846145, -18.830216944))
        make_face()
    # profile 60 of 61: a face of its own
    with BuildSketch(Plane.XY):
        with BuildLine():
            Line((6.968959178, -18.212182955), (6.736878839, -17.497913119))
            ThreePointArc((6.736878839, -17.497913119), (5.794068645, -17.832309681), (4.834765807, -18.115947107))
            Line((4.834765807, -18.115947107), (5.066846145, -18.830216944))
            ThreePointArc((5.066846145, -18.830216944), (6.02583139, -18.545602068), (6.968959178, -18.212182955))
        make_face()
    # profile 61 of 61: a face of its own
    with BuildSketch(Plane.XY):
        with BuildLine():
            ThreePointArc((4.469792035, -10.520537382), (3.841677281, -7.656601684), (1.582669817, -5.7875))
            ThreePointArc((1.582669817, -5.7875), (0, -6), (-1.582669817, -5.7875))
            ThreePointArc((-1.582669817, -5.7875), (-3.841677281, -7.656601684), (-4.469792035, -10.520537382))
            ThreePointArc((-4.469792035, -10.520537382), (-4.06221109, -11.936089115), (-3.219339867, -13.144177288))
            ThreePointArc((-3.219339867, -13.144177288), (0, -14.5), (3.219339867, -13.144177288))
            ThreePointArc((3.219339867, -13.144177288), (4.06221109, -11.936089115), (4.469792035, -10.520537382))
        make_face()
        with Locations((0, -10)):
            Circle(ESQUISSE1_R_3, mode=Mode.SUBTRACT)
    extrude(amount=BOSS_EXTRU_1_DEPTH)

    # Esquisse3 → Boss.-Extru.2 (add)
    with BuildSketch(Plane.XY.offset(6).offset(BOSS_EXTRU_2_START)):
        Circle(ESQUISSE3_R)
        Circle(ESQUISSE3_R_2, mode=Mode.SUBTRACT)
    extrude(amount=BOSS_EXTRU_2_DEPTH)


solid = part.part
